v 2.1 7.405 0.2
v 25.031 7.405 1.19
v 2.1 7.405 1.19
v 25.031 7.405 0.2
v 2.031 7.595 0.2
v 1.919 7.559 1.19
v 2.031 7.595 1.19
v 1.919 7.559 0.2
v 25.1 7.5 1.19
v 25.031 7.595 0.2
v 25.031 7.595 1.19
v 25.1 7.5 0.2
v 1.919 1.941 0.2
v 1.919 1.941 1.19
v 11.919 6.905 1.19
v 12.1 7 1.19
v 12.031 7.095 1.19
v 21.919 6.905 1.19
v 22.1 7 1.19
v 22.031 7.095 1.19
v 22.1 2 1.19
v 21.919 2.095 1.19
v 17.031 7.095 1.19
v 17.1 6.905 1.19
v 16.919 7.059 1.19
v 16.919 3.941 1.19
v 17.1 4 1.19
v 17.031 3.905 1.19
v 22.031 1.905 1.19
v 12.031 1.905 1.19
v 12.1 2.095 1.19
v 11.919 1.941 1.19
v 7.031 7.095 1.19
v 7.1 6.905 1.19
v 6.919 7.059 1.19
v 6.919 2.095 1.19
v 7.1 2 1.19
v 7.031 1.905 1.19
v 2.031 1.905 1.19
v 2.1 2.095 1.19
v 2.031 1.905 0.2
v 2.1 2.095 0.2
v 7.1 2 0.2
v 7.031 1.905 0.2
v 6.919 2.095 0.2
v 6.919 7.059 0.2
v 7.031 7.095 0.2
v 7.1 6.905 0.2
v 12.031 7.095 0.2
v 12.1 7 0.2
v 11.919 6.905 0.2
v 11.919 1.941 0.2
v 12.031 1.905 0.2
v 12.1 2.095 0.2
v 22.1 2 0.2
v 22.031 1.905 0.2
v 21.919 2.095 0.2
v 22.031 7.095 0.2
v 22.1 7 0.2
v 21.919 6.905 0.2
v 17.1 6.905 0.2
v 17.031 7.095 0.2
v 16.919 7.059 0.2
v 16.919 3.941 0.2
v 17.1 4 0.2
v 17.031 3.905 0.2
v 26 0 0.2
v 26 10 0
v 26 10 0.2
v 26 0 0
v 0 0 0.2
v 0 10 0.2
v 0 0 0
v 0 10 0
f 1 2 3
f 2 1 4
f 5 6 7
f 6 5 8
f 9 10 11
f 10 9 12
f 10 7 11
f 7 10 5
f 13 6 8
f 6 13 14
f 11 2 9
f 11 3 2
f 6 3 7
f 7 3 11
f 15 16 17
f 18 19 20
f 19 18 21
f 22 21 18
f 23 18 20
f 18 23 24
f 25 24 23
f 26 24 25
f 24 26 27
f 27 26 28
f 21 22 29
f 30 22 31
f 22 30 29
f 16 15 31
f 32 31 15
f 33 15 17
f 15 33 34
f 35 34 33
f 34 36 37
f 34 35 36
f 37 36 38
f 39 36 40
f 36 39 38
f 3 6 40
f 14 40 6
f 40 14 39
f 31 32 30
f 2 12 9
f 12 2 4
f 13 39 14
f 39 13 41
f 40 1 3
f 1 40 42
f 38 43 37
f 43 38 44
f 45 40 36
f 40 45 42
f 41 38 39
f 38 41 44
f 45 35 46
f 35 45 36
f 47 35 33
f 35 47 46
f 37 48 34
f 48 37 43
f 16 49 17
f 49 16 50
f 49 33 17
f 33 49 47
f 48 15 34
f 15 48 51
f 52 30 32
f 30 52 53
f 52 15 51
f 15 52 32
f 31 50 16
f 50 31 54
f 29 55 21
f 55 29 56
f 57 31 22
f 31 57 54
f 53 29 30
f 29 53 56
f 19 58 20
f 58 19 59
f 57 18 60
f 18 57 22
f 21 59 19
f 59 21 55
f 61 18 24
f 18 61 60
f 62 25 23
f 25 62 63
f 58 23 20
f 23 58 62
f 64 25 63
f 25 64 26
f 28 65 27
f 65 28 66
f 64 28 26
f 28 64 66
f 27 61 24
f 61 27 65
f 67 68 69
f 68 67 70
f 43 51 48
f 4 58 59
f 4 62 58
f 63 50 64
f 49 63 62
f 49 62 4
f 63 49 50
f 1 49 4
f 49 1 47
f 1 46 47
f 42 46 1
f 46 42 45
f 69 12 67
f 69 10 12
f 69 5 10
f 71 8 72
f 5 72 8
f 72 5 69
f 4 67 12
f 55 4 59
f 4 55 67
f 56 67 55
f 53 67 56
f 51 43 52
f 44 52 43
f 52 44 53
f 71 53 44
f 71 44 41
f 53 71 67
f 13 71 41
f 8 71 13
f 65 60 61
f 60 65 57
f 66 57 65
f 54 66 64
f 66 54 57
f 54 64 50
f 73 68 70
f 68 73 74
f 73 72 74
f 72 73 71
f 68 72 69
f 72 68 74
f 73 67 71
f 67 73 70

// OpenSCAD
w=0.2;
h = 1;
s = 0.5;

module point(p) {

  translate([p[0], p[1], 0])
  cylinder(d=w, h=h);
}

module line(p1, p2) {

  hull() {
    point(p1);
    point(p2);
  }
}

path = 
[ 
  [23, 5+s], 
  [0, 5+s],
  [0, 0],
  [5, 0],
  [5, 5],
  [10, 5],
  [10, 0],
  [20, 0],
  [20, 5],
  [15, 5],
  [15, 2]
];

#translate([2, 2, 0.2-0.01])
for (i = [0 : len(path) -2]) {
  line(path[i], path[i+1]);
}

cube([26, 10, 0.2]);
